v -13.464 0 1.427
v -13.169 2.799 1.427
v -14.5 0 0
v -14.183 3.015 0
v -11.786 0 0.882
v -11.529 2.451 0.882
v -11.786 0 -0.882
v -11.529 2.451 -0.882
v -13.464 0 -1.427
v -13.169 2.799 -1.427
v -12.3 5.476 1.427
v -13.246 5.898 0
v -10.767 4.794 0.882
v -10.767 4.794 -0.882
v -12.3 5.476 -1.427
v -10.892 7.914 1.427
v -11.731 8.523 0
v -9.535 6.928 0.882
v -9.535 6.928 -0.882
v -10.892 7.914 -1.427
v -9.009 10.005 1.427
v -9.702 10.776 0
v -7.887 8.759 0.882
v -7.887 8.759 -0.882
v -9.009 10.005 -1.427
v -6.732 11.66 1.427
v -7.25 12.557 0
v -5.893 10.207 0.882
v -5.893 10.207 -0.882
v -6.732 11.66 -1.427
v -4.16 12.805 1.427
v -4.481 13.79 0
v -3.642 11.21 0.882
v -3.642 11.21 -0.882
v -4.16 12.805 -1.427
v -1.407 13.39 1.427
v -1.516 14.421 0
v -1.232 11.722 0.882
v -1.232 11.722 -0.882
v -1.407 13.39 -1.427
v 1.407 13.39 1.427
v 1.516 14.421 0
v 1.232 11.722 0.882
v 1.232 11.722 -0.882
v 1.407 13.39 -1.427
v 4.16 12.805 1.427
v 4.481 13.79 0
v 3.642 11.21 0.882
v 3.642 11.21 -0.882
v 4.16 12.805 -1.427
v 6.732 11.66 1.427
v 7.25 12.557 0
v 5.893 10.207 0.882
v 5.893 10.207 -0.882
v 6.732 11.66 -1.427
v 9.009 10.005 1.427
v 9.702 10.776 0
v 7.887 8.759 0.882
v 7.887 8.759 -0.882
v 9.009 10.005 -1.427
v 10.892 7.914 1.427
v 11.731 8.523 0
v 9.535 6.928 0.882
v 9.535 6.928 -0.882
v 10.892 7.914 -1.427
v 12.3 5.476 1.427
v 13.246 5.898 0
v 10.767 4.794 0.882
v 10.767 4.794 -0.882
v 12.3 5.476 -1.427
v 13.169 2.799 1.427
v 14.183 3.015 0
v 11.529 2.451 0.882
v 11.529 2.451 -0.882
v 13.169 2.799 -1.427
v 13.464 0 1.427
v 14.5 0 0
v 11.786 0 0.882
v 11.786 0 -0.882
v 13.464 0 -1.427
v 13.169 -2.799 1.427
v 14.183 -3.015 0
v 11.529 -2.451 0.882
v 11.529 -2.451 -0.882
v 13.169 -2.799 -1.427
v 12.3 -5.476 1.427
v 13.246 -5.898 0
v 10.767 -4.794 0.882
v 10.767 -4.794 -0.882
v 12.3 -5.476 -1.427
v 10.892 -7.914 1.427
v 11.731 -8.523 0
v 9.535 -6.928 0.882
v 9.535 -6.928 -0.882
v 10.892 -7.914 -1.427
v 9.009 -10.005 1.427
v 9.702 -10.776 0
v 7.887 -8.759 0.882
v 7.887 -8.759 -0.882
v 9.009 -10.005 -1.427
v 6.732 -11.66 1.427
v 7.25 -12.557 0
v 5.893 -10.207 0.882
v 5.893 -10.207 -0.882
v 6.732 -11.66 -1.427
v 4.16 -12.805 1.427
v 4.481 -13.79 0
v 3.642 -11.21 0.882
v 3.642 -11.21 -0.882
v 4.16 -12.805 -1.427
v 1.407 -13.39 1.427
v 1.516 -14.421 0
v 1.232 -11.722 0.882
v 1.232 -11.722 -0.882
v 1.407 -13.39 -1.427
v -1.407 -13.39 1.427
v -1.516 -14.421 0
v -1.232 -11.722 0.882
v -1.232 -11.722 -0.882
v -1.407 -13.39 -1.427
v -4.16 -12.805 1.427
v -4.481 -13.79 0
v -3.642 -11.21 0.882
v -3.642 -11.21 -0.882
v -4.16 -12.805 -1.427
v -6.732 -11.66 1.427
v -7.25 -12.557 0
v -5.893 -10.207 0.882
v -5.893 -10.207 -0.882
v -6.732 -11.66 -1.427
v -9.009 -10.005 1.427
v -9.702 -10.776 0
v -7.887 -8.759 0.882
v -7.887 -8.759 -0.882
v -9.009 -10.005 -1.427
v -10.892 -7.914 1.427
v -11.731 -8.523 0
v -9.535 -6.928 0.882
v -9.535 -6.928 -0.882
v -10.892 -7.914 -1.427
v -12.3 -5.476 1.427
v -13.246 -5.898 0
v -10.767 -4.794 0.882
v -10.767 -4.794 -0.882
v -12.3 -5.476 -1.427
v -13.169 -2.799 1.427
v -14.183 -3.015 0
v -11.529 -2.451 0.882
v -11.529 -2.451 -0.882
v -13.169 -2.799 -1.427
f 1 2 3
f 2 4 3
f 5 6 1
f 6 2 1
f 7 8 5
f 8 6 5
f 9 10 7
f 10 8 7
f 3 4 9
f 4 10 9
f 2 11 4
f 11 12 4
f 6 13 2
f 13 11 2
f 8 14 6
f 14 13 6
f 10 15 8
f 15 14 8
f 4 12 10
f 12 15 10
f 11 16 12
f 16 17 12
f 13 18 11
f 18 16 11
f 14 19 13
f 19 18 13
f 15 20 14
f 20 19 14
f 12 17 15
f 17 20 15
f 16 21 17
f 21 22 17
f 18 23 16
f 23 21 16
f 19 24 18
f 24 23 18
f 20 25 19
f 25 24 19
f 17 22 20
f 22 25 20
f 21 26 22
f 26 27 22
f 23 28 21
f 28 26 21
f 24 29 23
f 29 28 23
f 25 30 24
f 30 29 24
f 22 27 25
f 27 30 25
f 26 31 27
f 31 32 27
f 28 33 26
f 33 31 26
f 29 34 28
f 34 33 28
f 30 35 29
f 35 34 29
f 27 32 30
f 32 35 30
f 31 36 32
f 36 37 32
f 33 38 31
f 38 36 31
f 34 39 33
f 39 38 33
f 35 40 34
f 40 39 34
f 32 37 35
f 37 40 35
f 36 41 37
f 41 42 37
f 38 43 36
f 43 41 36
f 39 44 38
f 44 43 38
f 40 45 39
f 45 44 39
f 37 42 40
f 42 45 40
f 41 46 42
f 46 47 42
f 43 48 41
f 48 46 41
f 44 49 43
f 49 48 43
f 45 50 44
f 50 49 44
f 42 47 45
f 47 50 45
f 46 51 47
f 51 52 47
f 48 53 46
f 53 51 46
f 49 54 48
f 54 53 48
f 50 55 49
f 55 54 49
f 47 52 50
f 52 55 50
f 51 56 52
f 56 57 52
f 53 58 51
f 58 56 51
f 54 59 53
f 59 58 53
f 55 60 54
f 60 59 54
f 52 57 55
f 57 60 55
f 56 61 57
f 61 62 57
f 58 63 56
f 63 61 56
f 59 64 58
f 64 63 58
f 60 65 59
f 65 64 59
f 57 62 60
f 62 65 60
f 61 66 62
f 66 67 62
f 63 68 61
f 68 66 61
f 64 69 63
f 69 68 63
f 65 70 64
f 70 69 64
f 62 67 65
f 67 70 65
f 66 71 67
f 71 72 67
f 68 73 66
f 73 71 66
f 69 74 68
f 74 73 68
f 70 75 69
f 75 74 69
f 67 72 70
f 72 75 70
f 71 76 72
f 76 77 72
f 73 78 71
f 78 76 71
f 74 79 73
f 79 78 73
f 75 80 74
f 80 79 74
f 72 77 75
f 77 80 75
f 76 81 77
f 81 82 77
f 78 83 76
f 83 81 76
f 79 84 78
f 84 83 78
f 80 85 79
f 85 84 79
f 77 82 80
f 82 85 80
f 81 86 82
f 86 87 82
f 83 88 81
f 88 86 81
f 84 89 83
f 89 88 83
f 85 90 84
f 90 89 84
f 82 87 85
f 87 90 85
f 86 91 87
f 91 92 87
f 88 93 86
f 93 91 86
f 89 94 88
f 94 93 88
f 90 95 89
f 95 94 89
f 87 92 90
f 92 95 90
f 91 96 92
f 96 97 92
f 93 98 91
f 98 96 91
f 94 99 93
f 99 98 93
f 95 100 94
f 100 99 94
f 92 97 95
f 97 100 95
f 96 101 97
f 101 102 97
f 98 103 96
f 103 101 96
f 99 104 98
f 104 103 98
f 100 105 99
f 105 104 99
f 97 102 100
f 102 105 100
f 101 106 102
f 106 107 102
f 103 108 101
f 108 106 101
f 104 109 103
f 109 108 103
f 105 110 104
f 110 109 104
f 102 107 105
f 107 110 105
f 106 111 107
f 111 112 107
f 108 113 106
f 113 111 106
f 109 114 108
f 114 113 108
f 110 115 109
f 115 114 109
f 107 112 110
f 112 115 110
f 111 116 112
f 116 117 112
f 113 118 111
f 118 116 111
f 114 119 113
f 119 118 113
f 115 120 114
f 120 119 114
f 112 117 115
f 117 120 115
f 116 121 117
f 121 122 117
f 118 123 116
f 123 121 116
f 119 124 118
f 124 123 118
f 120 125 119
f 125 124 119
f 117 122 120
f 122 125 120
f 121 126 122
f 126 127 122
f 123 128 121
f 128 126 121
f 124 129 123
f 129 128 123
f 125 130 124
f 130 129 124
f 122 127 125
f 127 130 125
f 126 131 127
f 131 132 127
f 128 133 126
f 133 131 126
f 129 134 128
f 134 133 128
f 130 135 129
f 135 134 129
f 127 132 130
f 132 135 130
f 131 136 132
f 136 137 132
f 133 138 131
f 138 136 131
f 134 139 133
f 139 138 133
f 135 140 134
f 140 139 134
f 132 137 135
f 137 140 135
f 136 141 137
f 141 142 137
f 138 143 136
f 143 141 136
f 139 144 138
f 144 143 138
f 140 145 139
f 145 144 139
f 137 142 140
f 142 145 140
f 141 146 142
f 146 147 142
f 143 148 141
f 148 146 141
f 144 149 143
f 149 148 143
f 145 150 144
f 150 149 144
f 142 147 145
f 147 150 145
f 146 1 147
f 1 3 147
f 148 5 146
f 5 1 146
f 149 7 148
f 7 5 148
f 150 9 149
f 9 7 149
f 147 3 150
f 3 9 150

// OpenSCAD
pi=3.14159;

module goupille(L=67,L1=20,r=1.5,d=13, fn=$fn)
{
//  cylinder(r=d/2,h=r);
  rotate_extrude(convexity=10)
    translate([d,0,0])
      circle(r=r);
          
  //sin part
//  offsetX = 0;
//  for(i=[0:2*360])
//    translate([i*10,0,0])
//      cube([10,10,200+200*cos(i+offsetX)]);
}

//A=25,B=27,D=13,d=3,L=67
goupille();

module quarterCircle(r=10,h=1,invert=false,expand=false)
{
  if(invert)
  {
    translate([-r,-r,0])
    {
      if(expand)
      {
        difference()
        {
          cube([r+1,r+1,h]);
          translate([0,0,-1])
          cylinder(r=r,h=h+2);
        }
      }
      else
      {
        difference()
        {
          cube([r,r,h]);
          translate([0,0,-1])
          cylinder(r=r,h=h+2);
        }
      }
    }
  }
  else
  {
    difference()
    {
      cylinder(r=r,h=h);
      translate([-r,-r,-1])
      {
        cube([2*r,r,h+2]);
        cube([r,2*r,h+2]);
      }
    }
  }
}
